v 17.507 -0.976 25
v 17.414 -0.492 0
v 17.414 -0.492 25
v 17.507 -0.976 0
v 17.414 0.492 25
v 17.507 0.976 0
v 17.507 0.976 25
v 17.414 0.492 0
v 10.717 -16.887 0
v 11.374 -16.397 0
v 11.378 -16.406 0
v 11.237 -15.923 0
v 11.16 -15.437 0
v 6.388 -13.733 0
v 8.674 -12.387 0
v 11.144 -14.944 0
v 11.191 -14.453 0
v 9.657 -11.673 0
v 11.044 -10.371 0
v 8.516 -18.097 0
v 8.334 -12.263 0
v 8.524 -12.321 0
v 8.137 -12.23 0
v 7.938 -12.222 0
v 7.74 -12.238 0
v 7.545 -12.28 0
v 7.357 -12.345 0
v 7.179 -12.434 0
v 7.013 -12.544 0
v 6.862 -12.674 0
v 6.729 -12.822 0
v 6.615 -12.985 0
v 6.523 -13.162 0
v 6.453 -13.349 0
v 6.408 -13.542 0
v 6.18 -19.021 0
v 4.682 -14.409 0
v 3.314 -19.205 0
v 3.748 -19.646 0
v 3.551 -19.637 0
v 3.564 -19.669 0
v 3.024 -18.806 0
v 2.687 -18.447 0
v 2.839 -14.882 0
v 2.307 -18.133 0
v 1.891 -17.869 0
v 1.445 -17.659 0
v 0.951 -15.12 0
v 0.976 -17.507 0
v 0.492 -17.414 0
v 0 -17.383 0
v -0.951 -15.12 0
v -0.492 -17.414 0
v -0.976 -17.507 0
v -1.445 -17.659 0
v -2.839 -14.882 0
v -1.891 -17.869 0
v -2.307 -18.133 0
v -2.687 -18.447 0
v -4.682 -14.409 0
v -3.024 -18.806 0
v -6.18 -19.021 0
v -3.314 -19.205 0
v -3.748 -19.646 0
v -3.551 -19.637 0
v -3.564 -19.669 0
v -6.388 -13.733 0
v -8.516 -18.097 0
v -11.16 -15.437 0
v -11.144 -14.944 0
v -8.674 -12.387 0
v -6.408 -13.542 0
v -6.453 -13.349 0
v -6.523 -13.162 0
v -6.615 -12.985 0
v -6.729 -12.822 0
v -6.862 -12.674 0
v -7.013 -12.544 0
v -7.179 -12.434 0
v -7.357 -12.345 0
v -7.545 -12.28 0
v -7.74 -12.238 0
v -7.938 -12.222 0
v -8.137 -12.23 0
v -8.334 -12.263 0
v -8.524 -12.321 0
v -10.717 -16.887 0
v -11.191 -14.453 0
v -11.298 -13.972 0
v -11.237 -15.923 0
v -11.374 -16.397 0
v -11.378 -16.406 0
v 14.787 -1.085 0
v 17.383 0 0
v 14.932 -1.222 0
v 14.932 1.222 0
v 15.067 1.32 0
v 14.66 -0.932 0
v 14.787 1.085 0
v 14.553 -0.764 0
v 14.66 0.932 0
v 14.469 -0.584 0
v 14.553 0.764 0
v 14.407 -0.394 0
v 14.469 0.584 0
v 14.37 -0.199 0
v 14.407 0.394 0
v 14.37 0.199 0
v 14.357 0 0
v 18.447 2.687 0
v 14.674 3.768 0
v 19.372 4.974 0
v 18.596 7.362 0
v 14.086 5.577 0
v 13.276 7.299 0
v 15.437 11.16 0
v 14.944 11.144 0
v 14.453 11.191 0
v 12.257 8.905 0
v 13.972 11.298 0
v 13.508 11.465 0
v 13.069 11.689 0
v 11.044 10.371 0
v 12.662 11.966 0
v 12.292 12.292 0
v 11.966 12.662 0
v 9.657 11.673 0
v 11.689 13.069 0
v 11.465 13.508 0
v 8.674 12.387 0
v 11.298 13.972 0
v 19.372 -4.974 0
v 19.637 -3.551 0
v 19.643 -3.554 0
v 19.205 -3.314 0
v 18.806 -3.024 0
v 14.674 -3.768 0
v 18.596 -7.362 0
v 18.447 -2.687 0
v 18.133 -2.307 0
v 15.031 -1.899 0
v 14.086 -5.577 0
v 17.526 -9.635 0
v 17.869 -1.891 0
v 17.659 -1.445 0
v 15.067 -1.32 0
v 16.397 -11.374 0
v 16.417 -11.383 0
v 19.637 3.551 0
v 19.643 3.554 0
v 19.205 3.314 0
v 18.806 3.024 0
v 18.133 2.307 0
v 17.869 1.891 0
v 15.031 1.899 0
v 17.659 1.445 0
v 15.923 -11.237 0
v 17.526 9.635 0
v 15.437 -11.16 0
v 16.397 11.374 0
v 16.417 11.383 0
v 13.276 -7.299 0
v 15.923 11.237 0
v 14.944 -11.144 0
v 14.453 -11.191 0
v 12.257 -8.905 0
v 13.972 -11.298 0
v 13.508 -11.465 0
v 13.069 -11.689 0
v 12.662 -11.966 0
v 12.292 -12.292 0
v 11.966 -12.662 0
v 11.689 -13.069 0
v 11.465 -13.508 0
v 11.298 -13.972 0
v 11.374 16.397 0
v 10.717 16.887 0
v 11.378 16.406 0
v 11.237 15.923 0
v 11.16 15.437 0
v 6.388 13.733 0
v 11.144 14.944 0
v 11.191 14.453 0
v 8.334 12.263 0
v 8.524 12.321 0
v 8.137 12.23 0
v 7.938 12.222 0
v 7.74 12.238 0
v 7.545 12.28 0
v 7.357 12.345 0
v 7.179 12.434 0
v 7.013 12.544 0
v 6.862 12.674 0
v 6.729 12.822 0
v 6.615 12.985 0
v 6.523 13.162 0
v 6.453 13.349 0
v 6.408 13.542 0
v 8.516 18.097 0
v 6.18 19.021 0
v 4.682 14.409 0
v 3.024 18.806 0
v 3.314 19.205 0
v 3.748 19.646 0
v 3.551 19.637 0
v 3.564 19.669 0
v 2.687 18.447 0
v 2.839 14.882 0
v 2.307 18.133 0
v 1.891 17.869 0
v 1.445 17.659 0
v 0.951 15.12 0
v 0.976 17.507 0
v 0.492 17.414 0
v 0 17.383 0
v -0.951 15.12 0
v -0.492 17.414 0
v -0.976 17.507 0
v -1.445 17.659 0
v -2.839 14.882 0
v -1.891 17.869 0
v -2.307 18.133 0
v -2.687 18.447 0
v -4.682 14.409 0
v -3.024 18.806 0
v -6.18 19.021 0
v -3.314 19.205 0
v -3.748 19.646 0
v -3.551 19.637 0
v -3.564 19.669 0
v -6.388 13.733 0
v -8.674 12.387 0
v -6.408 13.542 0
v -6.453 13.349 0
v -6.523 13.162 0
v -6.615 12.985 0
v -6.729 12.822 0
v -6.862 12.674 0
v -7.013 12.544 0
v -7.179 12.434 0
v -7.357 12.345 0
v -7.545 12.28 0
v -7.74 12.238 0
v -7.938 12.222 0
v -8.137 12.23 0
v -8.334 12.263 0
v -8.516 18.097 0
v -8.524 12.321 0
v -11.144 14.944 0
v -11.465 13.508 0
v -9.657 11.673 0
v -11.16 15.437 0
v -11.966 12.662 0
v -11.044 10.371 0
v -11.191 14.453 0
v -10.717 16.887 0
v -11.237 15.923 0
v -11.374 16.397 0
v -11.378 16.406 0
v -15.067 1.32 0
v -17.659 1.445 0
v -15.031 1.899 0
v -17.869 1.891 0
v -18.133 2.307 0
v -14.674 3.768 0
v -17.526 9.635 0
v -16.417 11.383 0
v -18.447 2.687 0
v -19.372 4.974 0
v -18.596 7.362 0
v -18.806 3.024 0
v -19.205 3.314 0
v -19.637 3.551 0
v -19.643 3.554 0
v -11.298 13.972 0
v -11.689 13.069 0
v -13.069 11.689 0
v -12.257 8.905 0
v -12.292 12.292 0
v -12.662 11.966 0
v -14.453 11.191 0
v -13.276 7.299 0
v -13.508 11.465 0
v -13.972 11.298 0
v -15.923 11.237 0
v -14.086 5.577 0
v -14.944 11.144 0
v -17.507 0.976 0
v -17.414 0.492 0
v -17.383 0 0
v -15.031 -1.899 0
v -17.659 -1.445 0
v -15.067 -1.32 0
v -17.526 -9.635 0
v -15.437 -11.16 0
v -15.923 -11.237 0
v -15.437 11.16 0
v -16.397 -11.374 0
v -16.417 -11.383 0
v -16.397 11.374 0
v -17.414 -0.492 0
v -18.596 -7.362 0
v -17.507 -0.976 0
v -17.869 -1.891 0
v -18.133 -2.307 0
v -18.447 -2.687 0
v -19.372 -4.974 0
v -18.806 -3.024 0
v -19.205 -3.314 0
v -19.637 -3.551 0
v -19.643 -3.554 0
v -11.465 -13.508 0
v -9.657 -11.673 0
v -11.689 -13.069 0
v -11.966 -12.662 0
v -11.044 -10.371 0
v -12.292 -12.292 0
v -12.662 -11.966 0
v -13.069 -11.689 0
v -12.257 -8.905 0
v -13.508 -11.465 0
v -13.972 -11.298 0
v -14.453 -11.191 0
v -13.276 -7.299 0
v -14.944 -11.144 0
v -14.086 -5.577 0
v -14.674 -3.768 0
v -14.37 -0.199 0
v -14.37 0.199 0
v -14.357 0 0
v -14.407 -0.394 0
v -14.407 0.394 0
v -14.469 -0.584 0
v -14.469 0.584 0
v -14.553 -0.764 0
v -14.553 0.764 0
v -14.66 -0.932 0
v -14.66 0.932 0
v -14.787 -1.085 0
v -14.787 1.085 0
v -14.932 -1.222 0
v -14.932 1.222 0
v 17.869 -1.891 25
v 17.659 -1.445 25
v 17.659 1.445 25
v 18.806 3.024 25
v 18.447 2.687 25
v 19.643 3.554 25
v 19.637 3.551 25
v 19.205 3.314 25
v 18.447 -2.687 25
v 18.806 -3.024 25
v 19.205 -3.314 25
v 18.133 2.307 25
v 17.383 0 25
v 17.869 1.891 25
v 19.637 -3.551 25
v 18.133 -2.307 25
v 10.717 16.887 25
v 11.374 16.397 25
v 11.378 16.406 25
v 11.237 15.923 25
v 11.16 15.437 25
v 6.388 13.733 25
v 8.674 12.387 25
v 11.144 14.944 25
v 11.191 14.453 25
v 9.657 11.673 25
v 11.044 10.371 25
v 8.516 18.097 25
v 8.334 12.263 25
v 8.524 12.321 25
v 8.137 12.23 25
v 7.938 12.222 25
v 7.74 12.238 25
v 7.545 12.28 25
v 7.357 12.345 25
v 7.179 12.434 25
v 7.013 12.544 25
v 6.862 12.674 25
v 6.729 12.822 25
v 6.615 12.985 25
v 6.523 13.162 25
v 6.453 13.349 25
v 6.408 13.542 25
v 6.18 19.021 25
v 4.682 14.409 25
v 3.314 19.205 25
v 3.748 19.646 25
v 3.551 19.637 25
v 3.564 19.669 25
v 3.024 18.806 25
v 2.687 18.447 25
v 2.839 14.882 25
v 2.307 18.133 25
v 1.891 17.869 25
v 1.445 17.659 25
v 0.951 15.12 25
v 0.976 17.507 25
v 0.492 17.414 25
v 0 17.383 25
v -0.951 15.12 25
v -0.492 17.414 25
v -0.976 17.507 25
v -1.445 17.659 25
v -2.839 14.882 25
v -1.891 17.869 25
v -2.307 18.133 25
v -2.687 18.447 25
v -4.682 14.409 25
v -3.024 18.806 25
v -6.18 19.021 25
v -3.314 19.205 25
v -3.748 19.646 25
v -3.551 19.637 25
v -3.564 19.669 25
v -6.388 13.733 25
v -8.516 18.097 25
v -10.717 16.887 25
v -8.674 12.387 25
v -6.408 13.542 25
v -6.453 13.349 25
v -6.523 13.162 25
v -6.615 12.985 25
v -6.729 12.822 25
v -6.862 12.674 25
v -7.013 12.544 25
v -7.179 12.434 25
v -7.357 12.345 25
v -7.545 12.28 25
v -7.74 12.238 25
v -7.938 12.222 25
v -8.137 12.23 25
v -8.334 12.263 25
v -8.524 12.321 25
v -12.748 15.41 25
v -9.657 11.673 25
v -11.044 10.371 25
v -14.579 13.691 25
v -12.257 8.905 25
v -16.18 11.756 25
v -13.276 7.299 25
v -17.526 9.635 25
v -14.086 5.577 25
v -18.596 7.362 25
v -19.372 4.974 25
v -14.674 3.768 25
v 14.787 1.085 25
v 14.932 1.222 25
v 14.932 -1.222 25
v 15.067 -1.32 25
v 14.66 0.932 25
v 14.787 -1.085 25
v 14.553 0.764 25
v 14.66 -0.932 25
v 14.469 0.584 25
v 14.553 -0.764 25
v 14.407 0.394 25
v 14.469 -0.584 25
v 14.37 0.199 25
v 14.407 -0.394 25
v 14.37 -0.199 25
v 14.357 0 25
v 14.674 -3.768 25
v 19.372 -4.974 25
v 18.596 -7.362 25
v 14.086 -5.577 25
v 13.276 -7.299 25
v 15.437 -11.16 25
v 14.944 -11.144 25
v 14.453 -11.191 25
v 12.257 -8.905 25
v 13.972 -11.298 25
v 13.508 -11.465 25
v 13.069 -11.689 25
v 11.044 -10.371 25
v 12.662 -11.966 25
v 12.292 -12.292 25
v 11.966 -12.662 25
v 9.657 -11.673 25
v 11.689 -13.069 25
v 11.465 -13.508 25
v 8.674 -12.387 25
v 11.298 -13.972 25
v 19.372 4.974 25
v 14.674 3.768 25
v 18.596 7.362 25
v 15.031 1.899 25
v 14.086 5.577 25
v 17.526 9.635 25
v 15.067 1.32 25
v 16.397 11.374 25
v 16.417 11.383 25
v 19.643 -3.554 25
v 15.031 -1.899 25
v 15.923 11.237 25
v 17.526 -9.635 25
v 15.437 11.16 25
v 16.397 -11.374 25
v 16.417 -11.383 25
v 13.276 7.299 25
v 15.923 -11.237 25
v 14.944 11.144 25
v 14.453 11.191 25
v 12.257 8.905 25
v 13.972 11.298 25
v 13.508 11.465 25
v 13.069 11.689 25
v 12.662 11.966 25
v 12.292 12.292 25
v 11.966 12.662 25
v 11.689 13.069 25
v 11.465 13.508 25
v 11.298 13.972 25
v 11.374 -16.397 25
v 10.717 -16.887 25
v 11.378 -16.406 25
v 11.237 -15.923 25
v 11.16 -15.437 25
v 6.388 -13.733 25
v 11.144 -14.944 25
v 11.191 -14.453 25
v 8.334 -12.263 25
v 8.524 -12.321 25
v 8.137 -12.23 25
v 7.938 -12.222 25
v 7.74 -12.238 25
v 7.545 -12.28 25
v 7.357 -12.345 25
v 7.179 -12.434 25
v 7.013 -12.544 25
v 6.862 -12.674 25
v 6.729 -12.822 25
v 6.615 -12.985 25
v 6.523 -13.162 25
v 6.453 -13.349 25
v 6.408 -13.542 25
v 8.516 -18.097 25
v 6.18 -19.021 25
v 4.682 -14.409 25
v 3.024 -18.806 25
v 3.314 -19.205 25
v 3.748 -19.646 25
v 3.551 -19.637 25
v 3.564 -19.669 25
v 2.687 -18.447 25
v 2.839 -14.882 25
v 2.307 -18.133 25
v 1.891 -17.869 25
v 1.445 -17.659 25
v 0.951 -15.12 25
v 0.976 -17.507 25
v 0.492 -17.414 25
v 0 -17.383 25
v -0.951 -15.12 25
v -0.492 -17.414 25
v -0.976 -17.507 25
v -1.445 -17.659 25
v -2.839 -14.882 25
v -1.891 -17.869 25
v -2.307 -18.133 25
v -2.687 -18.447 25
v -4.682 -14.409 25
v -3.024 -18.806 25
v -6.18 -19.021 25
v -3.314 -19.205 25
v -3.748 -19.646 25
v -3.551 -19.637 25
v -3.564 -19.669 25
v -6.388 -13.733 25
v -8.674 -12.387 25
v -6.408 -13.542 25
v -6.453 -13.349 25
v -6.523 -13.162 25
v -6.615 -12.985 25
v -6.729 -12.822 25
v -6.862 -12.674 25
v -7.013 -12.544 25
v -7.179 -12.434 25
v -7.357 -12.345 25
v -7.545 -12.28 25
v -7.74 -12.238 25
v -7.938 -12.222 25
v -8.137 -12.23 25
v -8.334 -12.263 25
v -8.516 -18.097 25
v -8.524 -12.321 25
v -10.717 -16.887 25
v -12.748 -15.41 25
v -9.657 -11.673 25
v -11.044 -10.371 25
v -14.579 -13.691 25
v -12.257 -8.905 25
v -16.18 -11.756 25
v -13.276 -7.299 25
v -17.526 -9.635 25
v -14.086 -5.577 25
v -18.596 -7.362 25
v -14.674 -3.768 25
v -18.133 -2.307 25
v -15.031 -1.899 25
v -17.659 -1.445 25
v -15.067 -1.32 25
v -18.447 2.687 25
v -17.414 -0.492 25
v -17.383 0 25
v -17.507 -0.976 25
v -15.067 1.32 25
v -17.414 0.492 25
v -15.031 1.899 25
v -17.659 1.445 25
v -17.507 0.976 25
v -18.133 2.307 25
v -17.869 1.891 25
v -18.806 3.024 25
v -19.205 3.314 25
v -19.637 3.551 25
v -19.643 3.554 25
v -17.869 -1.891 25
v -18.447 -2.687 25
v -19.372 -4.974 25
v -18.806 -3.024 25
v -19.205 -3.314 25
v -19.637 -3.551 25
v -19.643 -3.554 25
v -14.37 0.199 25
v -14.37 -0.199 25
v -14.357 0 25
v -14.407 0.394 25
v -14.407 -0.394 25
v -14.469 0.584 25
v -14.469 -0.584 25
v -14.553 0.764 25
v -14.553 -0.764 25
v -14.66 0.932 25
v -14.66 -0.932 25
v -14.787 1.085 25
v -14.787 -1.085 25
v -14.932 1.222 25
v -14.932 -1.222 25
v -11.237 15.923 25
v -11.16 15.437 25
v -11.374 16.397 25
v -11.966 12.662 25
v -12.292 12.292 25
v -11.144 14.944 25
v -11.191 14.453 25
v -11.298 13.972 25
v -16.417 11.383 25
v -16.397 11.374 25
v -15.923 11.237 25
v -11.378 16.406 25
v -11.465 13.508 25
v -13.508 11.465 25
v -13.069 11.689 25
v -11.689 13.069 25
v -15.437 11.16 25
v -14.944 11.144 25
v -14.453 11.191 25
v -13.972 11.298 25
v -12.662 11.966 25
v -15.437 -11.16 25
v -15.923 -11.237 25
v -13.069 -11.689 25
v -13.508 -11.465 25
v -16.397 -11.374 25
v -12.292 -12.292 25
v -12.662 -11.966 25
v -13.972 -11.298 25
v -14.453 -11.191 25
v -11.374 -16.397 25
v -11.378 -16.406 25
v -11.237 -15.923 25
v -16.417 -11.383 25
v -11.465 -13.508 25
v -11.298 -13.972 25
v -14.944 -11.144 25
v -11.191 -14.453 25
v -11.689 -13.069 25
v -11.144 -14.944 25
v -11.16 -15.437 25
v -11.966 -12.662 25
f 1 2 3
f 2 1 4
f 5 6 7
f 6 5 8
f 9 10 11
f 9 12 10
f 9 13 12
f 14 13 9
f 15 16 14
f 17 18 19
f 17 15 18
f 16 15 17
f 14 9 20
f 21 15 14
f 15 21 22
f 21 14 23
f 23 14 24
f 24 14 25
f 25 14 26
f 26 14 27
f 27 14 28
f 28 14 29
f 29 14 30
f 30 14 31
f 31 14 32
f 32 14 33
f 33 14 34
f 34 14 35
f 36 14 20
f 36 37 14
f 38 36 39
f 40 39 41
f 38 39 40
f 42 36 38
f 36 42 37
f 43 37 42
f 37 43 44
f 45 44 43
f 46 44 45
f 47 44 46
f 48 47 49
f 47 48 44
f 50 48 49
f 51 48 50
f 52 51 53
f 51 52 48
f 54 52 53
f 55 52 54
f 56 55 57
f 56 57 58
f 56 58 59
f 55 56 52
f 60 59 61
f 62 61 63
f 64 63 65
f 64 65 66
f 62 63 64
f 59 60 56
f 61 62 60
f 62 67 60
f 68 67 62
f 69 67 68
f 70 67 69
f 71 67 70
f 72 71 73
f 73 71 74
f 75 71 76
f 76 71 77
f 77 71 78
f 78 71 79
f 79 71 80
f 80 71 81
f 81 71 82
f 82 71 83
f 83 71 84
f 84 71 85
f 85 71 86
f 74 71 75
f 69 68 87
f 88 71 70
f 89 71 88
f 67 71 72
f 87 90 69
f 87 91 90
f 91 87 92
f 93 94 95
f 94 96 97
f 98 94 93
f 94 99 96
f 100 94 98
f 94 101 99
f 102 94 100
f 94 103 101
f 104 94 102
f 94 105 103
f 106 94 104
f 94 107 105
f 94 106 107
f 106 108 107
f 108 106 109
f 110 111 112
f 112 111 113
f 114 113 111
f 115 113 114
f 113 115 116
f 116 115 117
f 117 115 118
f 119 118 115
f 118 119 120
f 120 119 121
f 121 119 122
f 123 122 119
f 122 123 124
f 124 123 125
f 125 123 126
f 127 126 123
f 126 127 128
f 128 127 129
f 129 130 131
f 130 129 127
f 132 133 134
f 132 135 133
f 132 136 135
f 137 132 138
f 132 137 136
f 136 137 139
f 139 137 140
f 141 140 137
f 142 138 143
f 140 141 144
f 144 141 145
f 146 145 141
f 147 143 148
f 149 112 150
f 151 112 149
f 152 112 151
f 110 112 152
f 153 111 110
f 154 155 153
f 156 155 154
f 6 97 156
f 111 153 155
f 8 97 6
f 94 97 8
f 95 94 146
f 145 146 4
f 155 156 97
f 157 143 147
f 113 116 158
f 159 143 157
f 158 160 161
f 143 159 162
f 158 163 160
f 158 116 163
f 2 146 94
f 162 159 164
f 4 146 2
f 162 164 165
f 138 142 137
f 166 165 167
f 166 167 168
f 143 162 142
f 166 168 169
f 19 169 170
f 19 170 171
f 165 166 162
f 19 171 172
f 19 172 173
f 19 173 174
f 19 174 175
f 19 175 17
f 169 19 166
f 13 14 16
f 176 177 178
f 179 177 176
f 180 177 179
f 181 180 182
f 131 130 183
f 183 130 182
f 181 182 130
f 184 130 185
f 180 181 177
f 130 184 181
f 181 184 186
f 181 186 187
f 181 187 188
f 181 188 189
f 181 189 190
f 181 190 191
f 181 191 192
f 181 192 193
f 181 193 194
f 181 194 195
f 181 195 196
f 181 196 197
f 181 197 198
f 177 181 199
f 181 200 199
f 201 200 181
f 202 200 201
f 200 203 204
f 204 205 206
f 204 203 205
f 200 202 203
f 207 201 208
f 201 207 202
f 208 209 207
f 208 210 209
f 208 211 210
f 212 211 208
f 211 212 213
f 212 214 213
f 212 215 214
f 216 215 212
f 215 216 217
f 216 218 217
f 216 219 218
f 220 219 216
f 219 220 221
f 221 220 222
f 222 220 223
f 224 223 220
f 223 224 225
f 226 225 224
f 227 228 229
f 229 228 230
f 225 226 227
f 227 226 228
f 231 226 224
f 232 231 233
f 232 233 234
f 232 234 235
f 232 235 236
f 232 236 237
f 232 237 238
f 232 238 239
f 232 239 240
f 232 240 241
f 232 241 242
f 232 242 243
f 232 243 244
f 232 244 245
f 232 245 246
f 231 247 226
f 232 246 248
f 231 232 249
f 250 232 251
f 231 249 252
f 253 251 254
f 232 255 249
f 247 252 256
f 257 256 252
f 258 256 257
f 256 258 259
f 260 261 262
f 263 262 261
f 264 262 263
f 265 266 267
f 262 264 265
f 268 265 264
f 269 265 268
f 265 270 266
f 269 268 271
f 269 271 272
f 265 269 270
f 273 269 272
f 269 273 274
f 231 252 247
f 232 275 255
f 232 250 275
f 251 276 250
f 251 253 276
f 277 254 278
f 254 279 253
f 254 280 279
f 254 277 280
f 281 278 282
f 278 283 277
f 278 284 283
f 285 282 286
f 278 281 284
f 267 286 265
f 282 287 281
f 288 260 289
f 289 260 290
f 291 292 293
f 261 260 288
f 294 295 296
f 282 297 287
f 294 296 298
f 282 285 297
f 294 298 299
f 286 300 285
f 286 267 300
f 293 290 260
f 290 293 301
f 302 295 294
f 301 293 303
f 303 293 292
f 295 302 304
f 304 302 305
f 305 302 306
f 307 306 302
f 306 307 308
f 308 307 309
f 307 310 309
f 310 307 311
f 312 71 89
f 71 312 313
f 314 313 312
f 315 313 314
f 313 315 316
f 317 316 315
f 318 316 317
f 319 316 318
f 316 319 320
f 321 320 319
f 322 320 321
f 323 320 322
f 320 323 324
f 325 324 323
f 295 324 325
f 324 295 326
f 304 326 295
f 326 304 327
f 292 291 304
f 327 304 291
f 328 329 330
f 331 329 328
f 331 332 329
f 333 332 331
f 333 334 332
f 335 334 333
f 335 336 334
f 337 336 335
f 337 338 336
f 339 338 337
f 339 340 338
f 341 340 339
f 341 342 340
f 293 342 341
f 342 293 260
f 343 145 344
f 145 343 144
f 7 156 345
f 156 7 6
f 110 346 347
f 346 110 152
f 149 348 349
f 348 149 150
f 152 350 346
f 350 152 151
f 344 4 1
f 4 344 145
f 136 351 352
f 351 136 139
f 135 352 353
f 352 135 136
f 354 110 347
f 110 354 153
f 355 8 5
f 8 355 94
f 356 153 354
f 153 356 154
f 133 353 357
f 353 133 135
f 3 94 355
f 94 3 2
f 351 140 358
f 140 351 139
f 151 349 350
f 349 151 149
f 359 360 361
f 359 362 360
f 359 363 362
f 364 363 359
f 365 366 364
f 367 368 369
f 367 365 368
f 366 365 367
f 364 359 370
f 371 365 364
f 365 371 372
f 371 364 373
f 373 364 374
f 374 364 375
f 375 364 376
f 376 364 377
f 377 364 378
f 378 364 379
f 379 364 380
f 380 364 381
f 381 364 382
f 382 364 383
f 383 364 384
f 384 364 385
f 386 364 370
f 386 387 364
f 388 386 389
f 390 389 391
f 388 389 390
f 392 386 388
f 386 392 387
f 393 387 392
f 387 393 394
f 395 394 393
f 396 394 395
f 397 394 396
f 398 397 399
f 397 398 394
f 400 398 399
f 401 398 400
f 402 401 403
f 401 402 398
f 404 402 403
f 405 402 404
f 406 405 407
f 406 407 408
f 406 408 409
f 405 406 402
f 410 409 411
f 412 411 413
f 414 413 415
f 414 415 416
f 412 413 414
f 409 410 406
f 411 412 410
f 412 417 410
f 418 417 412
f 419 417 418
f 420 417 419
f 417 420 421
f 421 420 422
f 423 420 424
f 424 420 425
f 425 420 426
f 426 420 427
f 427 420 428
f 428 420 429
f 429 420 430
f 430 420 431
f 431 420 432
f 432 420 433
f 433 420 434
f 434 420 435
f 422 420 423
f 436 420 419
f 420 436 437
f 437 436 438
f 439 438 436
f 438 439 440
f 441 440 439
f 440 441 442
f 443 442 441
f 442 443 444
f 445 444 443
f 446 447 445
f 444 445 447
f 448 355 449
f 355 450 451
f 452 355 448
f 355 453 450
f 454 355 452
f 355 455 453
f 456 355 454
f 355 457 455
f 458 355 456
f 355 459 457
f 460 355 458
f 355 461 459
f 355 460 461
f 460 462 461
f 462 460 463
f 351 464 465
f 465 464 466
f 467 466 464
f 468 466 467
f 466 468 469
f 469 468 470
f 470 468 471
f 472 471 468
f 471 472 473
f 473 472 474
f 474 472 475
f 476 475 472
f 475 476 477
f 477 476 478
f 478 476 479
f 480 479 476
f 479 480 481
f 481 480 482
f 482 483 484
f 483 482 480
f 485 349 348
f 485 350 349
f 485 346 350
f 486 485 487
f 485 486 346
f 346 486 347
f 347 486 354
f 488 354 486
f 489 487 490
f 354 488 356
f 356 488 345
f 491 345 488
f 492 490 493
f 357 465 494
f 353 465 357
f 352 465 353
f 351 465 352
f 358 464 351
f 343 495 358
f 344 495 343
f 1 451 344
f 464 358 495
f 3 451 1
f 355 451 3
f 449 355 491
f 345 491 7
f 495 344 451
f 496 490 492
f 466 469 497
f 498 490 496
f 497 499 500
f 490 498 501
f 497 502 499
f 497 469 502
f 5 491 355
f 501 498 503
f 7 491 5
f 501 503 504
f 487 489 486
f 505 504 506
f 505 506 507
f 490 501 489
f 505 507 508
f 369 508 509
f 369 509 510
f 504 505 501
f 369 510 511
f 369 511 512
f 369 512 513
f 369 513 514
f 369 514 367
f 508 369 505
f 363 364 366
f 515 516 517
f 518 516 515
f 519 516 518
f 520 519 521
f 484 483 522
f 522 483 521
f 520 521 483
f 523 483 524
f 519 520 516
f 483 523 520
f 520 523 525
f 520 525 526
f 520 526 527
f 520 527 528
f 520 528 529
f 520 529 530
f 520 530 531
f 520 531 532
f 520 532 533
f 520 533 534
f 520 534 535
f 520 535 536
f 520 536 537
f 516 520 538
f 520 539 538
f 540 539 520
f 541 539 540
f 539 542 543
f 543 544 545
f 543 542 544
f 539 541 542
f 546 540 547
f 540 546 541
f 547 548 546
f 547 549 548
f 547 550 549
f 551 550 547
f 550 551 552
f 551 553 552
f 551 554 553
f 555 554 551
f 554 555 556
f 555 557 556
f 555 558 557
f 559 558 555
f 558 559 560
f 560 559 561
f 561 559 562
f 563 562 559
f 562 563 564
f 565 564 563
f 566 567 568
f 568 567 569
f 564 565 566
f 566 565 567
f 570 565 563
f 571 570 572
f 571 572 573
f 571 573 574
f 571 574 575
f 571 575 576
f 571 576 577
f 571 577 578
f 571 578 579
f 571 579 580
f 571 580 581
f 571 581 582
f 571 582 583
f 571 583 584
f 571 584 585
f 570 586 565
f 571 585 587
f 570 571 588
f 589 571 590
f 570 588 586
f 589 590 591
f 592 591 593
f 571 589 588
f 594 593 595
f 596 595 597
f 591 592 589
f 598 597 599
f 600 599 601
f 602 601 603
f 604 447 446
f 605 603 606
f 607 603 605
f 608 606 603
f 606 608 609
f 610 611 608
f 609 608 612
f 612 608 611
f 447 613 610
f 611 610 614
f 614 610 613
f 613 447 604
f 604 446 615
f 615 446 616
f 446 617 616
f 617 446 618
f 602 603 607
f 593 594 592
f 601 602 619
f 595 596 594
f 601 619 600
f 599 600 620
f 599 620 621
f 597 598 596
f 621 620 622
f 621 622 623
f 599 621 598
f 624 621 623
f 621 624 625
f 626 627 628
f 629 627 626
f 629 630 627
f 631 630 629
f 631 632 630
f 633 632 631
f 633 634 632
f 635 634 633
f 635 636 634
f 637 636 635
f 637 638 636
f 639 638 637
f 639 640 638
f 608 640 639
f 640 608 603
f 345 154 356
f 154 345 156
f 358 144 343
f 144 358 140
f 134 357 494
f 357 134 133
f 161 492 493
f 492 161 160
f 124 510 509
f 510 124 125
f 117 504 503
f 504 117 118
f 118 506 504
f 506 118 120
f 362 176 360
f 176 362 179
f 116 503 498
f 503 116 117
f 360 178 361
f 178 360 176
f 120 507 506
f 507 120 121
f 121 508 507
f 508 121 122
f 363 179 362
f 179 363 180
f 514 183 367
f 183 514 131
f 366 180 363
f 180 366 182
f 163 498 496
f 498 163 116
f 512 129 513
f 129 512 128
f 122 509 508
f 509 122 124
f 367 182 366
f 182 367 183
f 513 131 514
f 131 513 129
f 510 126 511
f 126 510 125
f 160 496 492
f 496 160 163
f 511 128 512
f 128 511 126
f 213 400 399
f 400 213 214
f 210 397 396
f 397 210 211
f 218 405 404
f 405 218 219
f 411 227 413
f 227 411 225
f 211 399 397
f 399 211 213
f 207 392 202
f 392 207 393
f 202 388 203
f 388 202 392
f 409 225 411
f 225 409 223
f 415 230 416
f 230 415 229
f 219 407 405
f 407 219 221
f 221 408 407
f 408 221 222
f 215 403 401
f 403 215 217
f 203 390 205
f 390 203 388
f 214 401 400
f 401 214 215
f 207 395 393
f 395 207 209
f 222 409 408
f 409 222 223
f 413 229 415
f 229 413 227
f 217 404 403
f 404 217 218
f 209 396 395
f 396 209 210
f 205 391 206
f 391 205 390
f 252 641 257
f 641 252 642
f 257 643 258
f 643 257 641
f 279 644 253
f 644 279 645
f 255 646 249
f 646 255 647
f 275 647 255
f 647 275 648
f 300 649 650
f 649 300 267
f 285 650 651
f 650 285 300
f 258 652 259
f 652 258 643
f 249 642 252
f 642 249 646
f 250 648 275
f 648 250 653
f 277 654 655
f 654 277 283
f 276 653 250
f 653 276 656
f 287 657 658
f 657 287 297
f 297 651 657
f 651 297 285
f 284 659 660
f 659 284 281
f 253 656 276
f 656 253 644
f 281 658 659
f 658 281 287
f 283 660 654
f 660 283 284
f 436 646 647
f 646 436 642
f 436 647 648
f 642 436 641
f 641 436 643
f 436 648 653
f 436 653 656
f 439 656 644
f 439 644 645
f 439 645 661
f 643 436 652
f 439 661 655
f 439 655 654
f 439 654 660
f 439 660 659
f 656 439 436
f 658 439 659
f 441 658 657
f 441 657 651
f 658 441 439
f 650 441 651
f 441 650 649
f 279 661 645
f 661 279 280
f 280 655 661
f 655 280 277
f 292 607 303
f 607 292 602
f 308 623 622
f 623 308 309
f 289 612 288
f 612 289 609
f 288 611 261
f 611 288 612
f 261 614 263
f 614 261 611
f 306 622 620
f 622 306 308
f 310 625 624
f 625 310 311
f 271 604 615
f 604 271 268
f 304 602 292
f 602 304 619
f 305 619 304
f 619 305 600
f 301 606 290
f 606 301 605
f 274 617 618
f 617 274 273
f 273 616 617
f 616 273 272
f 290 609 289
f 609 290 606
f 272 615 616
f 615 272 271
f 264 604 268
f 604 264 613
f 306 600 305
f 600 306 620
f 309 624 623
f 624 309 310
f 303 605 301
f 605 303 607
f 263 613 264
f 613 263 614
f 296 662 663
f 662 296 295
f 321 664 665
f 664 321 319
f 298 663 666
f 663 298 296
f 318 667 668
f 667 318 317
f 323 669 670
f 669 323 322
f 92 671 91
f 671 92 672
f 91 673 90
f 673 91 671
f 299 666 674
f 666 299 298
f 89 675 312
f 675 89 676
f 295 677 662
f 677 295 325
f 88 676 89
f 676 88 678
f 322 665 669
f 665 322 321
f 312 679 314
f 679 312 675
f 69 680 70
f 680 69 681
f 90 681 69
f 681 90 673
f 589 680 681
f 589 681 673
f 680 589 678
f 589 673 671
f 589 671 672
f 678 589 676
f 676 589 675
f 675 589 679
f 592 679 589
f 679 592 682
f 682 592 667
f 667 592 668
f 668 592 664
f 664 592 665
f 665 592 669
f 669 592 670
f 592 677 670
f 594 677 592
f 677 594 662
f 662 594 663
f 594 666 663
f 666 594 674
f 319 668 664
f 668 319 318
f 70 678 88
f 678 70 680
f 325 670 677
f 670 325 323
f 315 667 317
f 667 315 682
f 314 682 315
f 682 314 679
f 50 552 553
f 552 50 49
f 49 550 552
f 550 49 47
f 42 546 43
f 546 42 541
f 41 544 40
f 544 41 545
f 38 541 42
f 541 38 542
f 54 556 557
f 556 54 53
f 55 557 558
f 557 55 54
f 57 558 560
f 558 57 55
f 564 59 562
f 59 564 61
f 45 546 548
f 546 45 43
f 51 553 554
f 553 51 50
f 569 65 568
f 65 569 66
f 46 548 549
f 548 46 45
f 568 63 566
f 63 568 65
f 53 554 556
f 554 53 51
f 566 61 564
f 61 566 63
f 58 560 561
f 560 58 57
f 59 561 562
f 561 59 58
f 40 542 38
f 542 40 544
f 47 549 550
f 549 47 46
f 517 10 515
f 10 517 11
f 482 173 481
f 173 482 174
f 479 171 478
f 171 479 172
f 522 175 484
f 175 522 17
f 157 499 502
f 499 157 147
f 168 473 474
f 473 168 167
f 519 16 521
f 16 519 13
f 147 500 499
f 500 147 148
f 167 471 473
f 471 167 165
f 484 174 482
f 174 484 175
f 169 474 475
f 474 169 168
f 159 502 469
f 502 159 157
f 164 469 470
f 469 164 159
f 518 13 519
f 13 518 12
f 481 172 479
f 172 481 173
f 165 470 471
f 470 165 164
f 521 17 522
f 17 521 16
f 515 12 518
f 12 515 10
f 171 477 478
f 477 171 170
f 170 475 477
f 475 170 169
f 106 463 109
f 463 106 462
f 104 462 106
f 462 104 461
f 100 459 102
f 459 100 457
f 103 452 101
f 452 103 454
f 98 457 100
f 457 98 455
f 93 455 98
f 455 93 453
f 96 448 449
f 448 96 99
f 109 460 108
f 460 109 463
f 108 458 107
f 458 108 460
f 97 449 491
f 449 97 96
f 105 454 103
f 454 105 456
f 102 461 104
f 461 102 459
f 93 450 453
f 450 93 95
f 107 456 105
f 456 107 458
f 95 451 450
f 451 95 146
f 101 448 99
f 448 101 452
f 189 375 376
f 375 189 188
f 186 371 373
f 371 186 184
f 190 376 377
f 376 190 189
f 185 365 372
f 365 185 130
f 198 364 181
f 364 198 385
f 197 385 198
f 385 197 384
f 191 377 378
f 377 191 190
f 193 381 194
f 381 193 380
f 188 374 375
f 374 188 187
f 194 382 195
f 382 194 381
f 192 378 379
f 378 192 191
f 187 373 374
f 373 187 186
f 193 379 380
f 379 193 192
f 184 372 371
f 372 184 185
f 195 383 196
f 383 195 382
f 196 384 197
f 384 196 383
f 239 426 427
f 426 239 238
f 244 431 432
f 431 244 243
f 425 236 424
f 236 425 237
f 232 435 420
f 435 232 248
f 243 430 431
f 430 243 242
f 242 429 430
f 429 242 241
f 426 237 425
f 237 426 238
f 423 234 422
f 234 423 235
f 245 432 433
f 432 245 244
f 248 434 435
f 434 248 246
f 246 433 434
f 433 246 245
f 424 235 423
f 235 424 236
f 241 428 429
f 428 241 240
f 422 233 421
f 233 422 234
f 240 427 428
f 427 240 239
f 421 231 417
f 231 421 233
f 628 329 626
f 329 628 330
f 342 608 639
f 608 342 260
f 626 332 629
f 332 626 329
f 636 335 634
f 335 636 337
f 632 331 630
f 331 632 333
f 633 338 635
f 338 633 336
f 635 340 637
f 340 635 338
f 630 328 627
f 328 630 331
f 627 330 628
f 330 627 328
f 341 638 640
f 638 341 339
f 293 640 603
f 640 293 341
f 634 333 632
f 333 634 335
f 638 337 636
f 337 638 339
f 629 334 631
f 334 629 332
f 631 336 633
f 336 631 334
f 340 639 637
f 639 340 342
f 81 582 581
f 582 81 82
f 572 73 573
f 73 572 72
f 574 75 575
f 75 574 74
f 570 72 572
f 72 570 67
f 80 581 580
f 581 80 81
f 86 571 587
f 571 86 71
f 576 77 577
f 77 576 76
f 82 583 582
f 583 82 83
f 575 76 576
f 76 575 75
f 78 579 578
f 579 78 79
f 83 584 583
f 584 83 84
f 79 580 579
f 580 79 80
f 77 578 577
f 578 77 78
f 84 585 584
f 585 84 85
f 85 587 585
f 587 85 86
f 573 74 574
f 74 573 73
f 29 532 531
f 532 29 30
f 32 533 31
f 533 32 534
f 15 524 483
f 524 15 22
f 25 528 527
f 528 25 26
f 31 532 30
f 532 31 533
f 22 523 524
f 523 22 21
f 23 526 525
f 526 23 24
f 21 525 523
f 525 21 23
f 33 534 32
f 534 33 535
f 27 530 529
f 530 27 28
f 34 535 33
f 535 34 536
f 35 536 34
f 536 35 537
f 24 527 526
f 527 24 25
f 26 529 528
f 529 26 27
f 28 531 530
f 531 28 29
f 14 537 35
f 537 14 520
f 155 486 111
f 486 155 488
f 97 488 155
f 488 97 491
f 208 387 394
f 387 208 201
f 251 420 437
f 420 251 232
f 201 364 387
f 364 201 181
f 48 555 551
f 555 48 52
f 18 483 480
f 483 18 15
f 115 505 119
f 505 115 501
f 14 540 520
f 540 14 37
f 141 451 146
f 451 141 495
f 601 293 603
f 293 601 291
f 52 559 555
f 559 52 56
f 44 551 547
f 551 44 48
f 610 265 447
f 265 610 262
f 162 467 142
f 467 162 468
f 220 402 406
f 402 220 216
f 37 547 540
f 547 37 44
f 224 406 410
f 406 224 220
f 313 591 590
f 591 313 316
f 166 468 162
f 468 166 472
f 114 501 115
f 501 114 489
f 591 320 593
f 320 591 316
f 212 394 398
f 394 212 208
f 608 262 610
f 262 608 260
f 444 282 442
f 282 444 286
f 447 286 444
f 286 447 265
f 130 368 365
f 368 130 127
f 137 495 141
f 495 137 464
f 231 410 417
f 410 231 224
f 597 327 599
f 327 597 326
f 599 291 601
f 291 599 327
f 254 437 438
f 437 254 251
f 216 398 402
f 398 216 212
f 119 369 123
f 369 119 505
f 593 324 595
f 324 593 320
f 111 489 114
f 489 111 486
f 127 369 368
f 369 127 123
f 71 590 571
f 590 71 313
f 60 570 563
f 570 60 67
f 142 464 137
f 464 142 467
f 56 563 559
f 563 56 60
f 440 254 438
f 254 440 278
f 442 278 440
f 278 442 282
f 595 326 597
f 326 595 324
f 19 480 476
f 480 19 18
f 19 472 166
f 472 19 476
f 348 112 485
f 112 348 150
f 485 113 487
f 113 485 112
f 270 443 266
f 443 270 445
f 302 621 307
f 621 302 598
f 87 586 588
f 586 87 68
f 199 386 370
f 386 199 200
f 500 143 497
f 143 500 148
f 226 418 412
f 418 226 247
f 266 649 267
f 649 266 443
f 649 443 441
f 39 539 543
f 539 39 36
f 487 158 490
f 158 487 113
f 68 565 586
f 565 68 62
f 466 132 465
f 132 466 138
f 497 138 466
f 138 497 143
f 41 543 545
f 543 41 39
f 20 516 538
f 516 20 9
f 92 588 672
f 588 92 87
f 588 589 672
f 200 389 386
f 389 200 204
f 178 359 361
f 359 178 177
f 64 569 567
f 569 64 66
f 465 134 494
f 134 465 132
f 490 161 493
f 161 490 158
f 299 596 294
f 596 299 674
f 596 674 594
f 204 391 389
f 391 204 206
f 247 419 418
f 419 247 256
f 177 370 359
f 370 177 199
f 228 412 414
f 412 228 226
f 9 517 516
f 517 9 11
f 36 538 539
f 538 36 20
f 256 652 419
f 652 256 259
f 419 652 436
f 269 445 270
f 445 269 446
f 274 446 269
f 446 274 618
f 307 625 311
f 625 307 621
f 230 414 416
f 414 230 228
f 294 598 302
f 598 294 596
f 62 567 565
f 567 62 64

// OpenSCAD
// door_knob_v2.scad
// code inspired by: https://www.thingiverse.com/thing:3341986
// last update:19.01.2019 by djgan
// Version: 2.0

//Radius of the wheel inner
wheel_radius=15.15; 
//Radius of the wheel outer
wheel_radius2=20; 

//Height of the wheel inner
wheel_height=25;
//Height of the wheel outer
wheel_height2=25;

//Number of steps on the wheel for grip
wheel_steps=6; // inner
wheel_steps2=8; // outer

$fn=50;

module regular_polygon(order, r=1){
 	angles=[ for (i = [0:order-1]) i*(360/order) ];
 	coords=[ for (th=angles) [r*cos(th), r*sin(th)] ];
 	polygon(coords);
 }
 
 
union()  {
    translate([0,0,wheel_height]);  // inner
    translate([0,0,wheel_height2]); // outer
            // start outer
     difference() {
         cylinder(wheel_height2,wheel_radius2,wheel_radius2);
         grip_radius2=2*3.14*wheel_radius2/4/wheel_steps2; 
         grip_translate2=wheel_radius2+1/3*grip_radius2; 

         for(count=[0:1:wheel_steps2-1]) {
             angle=360/wheel_steps2*count;
             rotate(angle,[0,0,1]) {
             translate([grip_translate2,0,0]) cylinder(wheel_height2,grip_radius2,grip_radius2);
             }
         } 
        // start inner
            difference() {
                cylinder(wheel_height,wheel_radius,wheel_radius);
                grip_radius=1*3.14*wheel_radius/5/wheel_steps; 
                grip_translate=wheel_radius+1/2*grip_radius; 

                for(count=[0:1:wheel_steps-1]) {
                    angle=360/wheel_steps*count;
                    rotate(angle,[0,0,1]) {
                    translate([grip_translate,0,0]) cylinder(wheel_height,grip_radius,grip_radius);
                    }
                   } 
            }  // end inner
     }  // end outer
 } 
